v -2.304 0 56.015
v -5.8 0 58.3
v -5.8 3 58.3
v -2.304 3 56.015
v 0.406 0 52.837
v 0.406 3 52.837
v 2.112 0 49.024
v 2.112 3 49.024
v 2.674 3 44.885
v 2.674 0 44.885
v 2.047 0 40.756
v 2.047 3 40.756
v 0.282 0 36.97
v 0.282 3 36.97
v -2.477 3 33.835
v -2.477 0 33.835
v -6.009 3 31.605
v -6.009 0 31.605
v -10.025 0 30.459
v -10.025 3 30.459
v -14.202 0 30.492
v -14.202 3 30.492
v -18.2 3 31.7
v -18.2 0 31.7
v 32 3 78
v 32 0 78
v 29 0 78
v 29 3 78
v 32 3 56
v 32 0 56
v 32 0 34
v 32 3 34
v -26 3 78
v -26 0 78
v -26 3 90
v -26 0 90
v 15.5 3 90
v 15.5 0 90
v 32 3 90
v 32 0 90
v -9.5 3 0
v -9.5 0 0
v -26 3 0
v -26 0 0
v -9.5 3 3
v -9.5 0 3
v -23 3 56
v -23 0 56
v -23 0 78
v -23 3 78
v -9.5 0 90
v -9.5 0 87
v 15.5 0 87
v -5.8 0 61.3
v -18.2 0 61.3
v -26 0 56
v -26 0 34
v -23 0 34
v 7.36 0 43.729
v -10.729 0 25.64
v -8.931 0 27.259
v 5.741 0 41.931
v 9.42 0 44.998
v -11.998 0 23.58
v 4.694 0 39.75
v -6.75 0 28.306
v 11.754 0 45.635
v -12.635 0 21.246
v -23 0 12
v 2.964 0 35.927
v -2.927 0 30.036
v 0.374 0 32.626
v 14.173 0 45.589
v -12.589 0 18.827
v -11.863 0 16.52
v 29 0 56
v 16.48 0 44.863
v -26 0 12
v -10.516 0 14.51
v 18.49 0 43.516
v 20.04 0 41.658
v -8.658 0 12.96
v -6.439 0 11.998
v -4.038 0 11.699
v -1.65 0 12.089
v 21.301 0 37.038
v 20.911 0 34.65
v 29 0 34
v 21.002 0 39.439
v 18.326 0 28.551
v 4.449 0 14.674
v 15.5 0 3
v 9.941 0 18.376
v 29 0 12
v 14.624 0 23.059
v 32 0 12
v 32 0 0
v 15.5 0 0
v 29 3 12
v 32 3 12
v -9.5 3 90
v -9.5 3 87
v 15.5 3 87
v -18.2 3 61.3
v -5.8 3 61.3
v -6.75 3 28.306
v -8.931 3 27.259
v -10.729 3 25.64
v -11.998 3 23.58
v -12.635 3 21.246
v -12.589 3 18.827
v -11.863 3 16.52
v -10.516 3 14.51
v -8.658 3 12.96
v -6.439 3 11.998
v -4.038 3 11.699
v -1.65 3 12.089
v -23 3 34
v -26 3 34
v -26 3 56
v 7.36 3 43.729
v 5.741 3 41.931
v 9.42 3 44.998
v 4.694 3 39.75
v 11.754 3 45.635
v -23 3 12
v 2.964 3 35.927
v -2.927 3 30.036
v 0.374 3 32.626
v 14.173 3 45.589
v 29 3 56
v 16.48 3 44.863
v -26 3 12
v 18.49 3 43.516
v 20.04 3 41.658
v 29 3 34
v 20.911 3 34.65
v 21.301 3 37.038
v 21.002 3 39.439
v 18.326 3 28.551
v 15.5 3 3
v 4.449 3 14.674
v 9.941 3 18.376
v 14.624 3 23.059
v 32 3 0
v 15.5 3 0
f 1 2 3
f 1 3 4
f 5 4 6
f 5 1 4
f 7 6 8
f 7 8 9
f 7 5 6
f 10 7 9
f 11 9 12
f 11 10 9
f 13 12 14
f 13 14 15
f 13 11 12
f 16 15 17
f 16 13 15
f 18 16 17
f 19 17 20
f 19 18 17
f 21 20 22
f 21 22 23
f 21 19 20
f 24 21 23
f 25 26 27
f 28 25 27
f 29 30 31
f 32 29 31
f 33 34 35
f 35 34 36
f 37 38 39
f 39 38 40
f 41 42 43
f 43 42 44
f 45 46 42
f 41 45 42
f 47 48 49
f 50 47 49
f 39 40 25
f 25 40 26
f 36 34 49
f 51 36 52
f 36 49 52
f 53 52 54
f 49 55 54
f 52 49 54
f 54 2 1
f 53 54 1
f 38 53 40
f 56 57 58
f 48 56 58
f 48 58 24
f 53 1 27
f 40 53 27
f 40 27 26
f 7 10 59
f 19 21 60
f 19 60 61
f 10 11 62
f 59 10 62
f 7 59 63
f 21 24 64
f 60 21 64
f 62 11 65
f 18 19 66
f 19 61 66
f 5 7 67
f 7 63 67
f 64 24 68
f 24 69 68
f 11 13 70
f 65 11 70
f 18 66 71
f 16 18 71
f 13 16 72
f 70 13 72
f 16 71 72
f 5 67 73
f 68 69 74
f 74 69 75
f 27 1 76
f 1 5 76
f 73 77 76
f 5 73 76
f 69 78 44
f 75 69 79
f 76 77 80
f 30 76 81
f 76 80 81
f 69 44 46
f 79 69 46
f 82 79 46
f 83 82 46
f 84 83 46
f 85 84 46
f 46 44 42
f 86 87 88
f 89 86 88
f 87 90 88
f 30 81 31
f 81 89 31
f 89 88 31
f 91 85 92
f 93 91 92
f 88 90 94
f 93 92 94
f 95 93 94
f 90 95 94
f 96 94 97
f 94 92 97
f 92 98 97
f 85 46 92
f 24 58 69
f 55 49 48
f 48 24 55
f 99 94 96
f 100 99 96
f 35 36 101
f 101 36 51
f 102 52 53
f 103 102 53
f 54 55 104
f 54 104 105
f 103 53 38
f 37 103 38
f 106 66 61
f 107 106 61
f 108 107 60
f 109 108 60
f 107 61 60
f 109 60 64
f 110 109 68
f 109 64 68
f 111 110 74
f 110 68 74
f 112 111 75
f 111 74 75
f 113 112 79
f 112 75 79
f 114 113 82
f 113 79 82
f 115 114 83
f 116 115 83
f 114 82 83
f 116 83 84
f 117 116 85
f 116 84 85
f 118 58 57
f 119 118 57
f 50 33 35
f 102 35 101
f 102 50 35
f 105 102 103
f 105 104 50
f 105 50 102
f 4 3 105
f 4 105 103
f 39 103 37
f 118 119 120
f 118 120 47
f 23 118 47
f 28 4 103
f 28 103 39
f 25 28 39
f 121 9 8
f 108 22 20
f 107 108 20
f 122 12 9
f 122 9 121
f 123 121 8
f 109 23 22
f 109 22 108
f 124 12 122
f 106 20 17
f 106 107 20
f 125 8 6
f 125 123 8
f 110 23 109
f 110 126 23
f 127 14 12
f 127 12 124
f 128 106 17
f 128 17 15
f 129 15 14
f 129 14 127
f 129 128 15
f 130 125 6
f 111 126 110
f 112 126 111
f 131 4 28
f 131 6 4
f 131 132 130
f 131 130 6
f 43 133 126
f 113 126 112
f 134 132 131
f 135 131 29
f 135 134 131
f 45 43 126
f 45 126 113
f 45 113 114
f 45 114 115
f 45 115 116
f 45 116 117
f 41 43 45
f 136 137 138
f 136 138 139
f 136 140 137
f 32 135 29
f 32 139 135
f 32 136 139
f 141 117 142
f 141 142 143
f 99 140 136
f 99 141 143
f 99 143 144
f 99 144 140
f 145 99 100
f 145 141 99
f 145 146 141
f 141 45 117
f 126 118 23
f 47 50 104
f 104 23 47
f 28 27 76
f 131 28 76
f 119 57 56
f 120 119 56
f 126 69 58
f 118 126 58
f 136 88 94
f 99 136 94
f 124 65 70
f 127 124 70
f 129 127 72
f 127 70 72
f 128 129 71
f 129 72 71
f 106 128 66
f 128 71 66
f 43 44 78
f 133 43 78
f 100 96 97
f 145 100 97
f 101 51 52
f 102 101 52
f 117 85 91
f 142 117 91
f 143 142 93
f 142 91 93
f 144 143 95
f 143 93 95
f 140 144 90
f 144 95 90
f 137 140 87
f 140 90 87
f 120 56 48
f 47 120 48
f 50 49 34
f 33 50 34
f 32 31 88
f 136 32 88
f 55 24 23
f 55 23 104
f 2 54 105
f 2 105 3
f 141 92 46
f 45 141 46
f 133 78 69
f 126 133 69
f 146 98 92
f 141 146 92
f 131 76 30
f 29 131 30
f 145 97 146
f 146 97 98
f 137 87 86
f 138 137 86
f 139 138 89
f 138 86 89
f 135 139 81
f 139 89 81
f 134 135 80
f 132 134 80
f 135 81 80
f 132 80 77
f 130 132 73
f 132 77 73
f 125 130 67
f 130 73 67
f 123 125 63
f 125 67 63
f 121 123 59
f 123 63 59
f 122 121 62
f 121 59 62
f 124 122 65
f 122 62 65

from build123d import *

# Parameters (mm, degrees)
BOSS_EXTRUDE2_DEPTH = 3


with BuildPart() as part:
    # Sketch4 → Boss-Extrude2 (new body)
    with BuildSketch(Plane(origin=(0, 0, 0), x_dir=(1, 0, 0), z_dir=(0, 1, 0))):
        Polygon((-26, -90), (-9.5, -90), (-9.5, -87), (15.5, -87), (15.5, -90), (32, -90), (32, -78), (29, -78), (29, -56), (32, -56), (32, -34), (29, -34), (29, -12), (32, -12), (32, 0), (15.5, 0), (15.5, -3), (-9.5, -3), (-9.5, 0), (-26, 0), (-26, -12), (-23, -12), (-23, -34), (-26, -34), (-26, -56), (-23, -56), (-23, -78), (-26, -78), align=None)
        with BuildLine():
            Line((-18.2, -61.3), (-5.8, -61.3))
            Line((-5.8, -61.3), (-5.8, -58.3))
            ThreePointArc((-5.8, -58.3), (1.3, -38.8), (-18.2, -31.7))
            Line((-18.2, -31.7), (-18.2, -61.3))
        make_face(mode=Mode.SUBTRACT)
        with BuildLine():
            ThreePointArc((4.693936025, -39.75), (0.374368671, -32.625631329), (-6.75, -28.306063975))
            ThreePointArc((-6.75, -28.306063975), (-12.308483212, -17.647580763), (-1.65, -12.089097551))
            ThreePointArc((-1.65, -12.089097551), (12.395183951, -20.604816049), (20.910902449, -34.65))
            ThreePointArc((20.910902449, -34.65), (15.352419237, -45.308483212), (4.693936025, -39.75))
        make_face(mode=Mode.SUBTRACT)
    extrude(amount=BOSS_EXTRUDE2_DEPTH)


solid = part.part
